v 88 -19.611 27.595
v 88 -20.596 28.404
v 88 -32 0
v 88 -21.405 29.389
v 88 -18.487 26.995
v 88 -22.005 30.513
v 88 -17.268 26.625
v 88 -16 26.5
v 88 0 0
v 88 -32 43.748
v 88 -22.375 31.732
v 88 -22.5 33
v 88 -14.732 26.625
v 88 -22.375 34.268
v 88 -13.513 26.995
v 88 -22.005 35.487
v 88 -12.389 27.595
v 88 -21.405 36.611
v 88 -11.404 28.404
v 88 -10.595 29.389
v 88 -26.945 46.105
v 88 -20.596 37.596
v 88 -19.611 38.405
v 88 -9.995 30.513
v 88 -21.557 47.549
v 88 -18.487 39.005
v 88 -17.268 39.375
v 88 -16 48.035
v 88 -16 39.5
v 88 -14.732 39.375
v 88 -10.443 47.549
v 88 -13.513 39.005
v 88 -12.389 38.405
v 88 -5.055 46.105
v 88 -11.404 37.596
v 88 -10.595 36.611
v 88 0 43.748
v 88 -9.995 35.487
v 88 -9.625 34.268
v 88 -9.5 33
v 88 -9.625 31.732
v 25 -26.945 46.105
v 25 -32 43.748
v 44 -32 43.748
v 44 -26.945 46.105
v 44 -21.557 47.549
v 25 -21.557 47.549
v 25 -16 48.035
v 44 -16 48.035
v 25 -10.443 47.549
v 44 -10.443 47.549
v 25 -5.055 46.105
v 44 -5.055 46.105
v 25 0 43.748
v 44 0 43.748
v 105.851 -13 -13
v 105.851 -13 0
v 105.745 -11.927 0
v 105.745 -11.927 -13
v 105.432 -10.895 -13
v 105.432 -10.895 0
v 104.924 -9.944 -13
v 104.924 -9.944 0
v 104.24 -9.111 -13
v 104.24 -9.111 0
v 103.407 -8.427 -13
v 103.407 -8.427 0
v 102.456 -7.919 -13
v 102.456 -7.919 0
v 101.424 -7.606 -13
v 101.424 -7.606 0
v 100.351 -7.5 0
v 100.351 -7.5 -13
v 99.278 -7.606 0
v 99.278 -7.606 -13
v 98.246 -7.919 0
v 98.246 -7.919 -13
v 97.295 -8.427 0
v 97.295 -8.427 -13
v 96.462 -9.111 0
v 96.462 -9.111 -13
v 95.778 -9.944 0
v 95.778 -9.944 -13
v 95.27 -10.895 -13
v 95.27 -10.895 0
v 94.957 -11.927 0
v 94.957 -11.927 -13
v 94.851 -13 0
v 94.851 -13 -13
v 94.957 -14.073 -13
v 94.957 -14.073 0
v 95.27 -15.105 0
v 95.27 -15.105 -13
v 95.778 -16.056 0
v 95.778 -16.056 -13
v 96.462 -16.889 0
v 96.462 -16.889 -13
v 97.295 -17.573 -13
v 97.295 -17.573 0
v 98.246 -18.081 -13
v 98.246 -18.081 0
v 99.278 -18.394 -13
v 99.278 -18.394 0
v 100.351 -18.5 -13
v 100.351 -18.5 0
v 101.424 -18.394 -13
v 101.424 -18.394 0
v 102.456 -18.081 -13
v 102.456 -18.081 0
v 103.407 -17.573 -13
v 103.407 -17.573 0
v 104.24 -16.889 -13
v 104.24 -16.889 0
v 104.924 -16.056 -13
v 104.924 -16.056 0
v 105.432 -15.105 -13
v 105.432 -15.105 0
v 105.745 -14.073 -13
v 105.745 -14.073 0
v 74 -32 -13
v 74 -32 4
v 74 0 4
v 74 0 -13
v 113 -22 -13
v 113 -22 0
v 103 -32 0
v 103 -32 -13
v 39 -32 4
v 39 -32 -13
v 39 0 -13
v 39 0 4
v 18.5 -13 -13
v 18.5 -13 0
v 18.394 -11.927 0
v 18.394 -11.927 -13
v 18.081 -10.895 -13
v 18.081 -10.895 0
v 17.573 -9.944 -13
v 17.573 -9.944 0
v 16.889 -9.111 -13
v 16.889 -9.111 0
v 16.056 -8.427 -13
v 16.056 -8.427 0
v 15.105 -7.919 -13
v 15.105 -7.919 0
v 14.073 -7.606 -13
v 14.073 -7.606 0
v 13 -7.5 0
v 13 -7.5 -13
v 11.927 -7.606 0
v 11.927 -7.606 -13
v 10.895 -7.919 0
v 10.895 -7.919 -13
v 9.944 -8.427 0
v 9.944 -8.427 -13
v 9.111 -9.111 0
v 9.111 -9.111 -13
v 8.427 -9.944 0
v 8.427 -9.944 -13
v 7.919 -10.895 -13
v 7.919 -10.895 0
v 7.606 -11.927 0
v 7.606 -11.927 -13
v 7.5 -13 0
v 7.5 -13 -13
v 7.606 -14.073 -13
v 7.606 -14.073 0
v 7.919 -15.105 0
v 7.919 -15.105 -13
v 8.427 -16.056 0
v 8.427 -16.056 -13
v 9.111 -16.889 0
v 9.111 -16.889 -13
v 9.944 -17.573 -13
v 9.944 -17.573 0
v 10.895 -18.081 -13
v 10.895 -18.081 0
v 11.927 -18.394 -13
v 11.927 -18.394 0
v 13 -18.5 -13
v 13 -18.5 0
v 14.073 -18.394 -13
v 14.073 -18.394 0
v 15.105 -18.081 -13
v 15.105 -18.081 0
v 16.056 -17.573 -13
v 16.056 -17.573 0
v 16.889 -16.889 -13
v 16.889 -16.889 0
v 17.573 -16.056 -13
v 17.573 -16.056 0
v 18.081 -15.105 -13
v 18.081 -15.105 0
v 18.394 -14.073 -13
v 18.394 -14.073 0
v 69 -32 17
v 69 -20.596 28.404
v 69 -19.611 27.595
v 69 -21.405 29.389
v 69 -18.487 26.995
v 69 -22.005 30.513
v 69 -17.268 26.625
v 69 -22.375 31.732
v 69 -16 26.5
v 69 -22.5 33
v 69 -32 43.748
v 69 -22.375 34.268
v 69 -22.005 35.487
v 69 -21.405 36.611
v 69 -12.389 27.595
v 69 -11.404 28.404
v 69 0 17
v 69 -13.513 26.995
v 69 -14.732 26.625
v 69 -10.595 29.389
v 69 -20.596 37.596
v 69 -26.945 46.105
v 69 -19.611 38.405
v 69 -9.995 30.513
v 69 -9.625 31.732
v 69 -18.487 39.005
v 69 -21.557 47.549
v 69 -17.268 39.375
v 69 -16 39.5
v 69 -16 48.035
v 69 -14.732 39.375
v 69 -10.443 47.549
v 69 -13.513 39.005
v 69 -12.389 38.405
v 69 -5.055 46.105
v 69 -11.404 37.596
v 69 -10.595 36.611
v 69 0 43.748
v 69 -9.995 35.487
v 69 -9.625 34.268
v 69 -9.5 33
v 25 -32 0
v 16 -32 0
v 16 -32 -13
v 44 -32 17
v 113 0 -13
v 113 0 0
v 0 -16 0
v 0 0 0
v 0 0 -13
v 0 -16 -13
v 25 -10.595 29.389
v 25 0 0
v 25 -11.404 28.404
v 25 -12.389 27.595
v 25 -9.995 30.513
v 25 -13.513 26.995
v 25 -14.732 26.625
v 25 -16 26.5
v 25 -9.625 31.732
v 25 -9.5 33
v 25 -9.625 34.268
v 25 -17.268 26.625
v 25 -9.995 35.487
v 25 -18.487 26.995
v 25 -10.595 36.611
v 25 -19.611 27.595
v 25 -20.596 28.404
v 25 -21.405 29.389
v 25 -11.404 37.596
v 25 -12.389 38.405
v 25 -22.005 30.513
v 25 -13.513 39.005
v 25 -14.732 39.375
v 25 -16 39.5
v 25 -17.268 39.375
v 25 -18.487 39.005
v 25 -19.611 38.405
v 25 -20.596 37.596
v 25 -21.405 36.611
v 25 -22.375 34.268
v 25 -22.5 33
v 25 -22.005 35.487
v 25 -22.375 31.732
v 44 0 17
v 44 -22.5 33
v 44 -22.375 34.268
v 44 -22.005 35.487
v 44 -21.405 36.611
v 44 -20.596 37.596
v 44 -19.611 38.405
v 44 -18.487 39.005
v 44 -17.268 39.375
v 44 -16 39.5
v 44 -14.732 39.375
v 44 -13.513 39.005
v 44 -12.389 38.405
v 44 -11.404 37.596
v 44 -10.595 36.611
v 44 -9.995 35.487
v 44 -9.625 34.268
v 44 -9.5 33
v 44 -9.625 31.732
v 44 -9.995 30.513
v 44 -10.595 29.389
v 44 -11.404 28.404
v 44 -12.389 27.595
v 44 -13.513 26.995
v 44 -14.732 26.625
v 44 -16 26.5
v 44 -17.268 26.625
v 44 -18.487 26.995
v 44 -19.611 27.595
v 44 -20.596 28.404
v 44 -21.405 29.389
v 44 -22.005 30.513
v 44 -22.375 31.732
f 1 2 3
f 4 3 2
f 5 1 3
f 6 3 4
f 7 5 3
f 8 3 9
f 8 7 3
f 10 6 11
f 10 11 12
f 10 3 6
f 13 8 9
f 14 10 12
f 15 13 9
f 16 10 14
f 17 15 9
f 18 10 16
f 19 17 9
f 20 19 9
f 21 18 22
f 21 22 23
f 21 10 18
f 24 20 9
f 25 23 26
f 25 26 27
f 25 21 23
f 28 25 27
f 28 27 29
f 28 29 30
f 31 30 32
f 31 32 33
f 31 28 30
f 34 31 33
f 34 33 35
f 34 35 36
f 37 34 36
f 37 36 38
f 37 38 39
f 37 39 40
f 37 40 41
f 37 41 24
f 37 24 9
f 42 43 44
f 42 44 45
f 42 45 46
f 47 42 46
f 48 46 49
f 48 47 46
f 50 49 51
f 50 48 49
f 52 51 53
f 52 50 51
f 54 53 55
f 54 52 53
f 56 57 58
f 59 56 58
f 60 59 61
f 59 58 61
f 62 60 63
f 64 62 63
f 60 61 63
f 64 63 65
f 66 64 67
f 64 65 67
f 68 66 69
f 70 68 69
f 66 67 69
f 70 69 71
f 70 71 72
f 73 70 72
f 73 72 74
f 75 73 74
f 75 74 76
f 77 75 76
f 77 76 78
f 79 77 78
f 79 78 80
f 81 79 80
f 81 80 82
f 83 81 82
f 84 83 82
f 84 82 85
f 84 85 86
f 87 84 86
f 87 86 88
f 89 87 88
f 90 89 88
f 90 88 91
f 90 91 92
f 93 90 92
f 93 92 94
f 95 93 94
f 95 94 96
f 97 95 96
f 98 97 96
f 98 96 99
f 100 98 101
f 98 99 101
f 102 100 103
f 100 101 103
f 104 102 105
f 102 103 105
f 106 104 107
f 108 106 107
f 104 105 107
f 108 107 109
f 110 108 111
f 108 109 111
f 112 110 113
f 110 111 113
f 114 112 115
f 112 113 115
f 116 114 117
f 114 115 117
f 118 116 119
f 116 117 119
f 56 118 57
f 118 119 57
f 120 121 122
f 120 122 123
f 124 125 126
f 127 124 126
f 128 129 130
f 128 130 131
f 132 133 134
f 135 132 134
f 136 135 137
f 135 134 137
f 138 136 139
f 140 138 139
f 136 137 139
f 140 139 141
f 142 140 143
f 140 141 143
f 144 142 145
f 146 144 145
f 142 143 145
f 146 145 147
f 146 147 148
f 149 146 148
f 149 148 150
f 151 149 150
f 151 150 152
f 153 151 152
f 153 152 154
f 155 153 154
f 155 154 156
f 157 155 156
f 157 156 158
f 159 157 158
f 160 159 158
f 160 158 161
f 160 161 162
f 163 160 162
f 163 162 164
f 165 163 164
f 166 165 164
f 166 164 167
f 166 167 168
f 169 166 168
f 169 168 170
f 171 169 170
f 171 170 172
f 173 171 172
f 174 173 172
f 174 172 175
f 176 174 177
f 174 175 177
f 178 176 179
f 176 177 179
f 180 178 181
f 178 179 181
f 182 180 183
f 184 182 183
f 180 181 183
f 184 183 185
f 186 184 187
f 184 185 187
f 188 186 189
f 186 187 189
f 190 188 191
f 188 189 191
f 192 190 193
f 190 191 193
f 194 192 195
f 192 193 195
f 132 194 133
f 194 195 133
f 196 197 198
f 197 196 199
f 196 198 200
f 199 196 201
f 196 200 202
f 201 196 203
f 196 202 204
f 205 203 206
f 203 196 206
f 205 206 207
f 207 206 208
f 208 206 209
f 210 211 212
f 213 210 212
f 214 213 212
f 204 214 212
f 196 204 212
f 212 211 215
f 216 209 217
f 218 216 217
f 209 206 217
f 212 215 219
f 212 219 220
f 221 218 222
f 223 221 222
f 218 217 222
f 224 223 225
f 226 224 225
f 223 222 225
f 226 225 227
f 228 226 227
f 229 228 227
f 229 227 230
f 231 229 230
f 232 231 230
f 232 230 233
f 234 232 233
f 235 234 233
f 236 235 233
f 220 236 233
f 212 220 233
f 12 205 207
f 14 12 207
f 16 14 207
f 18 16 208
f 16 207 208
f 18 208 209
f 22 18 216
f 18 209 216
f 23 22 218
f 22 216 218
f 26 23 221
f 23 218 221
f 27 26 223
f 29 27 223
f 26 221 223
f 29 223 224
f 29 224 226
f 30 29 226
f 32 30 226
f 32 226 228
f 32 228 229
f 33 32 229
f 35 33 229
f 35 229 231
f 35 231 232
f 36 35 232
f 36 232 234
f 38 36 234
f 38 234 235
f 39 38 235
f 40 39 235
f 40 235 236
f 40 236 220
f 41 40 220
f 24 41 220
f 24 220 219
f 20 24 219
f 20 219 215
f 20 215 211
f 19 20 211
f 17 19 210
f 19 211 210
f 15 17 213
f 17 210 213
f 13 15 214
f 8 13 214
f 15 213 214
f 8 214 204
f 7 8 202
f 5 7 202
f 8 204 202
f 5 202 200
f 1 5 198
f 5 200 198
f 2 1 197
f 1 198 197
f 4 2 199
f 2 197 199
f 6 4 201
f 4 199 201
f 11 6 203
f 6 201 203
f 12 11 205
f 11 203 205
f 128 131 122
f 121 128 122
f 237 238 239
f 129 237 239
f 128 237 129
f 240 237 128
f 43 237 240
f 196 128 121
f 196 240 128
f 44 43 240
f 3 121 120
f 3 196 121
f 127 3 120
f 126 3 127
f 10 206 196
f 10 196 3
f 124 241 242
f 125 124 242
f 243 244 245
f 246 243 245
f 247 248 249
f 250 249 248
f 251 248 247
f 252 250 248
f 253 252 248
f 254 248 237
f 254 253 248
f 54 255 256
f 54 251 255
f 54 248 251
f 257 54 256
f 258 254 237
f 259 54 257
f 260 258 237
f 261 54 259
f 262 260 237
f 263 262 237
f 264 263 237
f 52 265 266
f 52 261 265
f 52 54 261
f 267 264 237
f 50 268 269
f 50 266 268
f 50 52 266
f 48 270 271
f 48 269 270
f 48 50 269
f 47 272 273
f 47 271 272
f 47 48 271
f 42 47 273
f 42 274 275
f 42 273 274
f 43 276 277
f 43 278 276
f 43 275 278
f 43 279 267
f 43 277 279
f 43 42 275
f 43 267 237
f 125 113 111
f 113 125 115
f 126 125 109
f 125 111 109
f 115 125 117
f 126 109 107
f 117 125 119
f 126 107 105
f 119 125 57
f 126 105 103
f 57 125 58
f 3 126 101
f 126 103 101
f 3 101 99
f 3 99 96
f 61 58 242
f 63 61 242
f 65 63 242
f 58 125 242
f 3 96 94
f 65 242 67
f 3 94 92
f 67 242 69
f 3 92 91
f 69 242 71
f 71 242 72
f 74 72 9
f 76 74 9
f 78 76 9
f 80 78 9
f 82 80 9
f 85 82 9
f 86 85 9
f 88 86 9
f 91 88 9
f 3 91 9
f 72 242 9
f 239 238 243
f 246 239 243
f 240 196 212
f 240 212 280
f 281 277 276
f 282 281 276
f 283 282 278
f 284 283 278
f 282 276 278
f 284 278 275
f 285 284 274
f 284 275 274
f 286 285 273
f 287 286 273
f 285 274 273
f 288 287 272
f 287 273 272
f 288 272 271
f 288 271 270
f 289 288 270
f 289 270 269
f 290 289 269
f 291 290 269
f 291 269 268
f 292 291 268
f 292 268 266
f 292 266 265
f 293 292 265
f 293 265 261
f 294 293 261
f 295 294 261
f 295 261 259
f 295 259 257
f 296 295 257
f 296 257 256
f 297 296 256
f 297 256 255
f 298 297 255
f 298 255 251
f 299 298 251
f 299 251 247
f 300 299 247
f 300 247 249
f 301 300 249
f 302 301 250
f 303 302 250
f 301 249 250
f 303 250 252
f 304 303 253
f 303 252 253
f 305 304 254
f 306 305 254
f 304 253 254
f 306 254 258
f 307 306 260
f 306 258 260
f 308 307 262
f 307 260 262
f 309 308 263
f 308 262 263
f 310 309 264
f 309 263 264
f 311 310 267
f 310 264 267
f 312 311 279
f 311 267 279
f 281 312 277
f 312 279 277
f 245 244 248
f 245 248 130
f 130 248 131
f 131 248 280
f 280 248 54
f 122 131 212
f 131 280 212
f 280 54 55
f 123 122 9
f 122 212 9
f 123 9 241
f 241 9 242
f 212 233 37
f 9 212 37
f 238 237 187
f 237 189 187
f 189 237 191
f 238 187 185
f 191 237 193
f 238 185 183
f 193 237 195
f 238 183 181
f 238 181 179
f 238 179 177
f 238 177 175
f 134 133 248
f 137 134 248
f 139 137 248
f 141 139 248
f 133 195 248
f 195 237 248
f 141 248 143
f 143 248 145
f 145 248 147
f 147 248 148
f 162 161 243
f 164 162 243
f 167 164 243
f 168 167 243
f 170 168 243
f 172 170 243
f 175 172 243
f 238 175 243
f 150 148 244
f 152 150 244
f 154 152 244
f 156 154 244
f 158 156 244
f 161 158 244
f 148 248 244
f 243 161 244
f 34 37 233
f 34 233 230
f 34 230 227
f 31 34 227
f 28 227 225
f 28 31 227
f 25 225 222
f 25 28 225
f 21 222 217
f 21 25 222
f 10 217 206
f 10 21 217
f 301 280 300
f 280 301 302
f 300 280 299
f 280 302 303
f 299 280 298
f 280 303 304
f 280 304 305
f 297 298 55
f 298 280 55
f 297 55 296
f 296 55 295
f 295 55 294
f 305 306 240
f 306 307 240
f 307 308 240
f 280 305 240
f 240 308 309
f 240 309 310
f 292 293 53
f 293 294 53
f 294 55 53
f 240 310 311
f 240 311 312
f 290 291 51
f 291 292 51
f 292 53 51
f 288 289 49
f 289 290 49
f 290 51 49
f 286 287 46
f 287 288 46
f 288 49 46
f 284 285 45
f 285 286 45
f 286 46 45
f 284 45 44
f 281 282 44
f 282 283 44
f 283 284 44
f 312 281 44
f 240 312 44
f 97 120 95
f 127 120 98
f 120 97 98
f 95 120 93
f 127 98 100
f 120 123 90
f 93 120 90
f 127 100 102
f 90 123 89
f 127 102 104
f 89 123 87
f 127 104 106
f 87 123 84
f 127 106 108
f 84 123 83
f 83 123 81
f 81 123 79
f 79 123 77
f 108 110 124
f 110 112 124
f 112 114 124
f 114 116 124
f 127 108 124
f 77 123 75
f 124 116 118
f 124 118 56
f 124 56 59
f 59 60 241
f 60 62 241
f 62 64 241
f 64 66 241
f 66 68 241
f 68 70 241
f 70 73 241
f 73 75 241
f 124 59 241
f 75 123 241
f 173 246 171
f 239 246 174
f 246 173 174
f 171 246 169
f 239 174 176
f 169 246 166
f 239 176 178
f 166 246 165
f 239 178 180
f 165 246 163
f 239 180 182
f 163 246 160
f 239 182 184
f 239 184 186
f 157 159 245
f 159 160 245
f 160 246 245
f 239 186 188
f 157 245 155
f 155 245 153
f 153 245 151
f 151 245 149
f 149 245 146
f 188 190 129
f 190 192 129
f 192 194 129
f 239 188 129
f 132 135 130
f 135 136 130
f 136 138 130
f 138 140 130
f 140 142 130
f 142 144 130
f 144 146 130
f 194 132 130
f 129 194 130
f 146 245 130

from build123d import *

# Parameters (mm, degrees)
F1_DEPTH = 32
F2_R     = 5.5
F3_DEPTH = 13.001
F5_DEPTH = 19
F4_R     = 6.5
F6_DEPTH = 88.001
F8_DEPTH = 19


with BuildPart() as f1:
    # F0 (on Front) → F1 (new body)
    with BuildSketch(Plane.XZ):
        Polygon((25, 0), (0, 0), (0, -13), (39, -13), (39, 4), (74, 4), (74, -13), (113, -13), (113, 0), (88, 0), (88, 43.748), (69, 43.748), (69, 17), (44, 17), (44, 43.748), (25, 43.748), align=None)
    extrude(amount=F1_DEPTH)

    # F2 (on Top) → F3 (cut, through all)
    with BuildSketch(Plane.XY):
        with Locations((13, -13)):
            Circle(F2_R)
        with Locations((100.350889, -13)):
            Circle(F2_R)
        Polygon((16, -32), (0, -16), (0, -32), align=None)
        Polygon((113, -22), (103, -32), (113, -32), align=None)
    extrude(amount=-F3_DEPTH, mode=Mode.SUBTRACT)

    # F4 (on face) → F5 (join)
    with BuildSketch(Plane(origin=(25, 0, 0), x_dir=(0, -1, 0), z_dir=(-1, 0, 0))):
        with BuildLine():
            ThreePointArc((32, 43.748), (16, 48.035187), (0, 43.748))
            Line((0, 43.748), (32, 43.748))
        make_face()
    extrude(amount=-F5_DEPTH)

    # F4 (on face) → F6 (cut, through all)
    with BuildSketch(Plane(origin=(25, 0, 0), x_dir=(0, -1, 0), z_dir=(-1, 0, 0))):
        with Locations((16, 33)):
            Circle(F4_R)
    extrude(amount=-F6_DEPTH, mode=Mode.SUBTRACT)

    # F7 (on face) → F8 (join)
    with BuildSketch(Plane.YZ.offset(88)):
        with BuildLine():
            ThreePointArc((0, 43.748), (-16, 48.035187), (-32, 43.748))
            Line((-32, 43.748), (0, 43.748))
        make_face()
    extrude(amount=-F8_DEPTH)


solid = f1.part
